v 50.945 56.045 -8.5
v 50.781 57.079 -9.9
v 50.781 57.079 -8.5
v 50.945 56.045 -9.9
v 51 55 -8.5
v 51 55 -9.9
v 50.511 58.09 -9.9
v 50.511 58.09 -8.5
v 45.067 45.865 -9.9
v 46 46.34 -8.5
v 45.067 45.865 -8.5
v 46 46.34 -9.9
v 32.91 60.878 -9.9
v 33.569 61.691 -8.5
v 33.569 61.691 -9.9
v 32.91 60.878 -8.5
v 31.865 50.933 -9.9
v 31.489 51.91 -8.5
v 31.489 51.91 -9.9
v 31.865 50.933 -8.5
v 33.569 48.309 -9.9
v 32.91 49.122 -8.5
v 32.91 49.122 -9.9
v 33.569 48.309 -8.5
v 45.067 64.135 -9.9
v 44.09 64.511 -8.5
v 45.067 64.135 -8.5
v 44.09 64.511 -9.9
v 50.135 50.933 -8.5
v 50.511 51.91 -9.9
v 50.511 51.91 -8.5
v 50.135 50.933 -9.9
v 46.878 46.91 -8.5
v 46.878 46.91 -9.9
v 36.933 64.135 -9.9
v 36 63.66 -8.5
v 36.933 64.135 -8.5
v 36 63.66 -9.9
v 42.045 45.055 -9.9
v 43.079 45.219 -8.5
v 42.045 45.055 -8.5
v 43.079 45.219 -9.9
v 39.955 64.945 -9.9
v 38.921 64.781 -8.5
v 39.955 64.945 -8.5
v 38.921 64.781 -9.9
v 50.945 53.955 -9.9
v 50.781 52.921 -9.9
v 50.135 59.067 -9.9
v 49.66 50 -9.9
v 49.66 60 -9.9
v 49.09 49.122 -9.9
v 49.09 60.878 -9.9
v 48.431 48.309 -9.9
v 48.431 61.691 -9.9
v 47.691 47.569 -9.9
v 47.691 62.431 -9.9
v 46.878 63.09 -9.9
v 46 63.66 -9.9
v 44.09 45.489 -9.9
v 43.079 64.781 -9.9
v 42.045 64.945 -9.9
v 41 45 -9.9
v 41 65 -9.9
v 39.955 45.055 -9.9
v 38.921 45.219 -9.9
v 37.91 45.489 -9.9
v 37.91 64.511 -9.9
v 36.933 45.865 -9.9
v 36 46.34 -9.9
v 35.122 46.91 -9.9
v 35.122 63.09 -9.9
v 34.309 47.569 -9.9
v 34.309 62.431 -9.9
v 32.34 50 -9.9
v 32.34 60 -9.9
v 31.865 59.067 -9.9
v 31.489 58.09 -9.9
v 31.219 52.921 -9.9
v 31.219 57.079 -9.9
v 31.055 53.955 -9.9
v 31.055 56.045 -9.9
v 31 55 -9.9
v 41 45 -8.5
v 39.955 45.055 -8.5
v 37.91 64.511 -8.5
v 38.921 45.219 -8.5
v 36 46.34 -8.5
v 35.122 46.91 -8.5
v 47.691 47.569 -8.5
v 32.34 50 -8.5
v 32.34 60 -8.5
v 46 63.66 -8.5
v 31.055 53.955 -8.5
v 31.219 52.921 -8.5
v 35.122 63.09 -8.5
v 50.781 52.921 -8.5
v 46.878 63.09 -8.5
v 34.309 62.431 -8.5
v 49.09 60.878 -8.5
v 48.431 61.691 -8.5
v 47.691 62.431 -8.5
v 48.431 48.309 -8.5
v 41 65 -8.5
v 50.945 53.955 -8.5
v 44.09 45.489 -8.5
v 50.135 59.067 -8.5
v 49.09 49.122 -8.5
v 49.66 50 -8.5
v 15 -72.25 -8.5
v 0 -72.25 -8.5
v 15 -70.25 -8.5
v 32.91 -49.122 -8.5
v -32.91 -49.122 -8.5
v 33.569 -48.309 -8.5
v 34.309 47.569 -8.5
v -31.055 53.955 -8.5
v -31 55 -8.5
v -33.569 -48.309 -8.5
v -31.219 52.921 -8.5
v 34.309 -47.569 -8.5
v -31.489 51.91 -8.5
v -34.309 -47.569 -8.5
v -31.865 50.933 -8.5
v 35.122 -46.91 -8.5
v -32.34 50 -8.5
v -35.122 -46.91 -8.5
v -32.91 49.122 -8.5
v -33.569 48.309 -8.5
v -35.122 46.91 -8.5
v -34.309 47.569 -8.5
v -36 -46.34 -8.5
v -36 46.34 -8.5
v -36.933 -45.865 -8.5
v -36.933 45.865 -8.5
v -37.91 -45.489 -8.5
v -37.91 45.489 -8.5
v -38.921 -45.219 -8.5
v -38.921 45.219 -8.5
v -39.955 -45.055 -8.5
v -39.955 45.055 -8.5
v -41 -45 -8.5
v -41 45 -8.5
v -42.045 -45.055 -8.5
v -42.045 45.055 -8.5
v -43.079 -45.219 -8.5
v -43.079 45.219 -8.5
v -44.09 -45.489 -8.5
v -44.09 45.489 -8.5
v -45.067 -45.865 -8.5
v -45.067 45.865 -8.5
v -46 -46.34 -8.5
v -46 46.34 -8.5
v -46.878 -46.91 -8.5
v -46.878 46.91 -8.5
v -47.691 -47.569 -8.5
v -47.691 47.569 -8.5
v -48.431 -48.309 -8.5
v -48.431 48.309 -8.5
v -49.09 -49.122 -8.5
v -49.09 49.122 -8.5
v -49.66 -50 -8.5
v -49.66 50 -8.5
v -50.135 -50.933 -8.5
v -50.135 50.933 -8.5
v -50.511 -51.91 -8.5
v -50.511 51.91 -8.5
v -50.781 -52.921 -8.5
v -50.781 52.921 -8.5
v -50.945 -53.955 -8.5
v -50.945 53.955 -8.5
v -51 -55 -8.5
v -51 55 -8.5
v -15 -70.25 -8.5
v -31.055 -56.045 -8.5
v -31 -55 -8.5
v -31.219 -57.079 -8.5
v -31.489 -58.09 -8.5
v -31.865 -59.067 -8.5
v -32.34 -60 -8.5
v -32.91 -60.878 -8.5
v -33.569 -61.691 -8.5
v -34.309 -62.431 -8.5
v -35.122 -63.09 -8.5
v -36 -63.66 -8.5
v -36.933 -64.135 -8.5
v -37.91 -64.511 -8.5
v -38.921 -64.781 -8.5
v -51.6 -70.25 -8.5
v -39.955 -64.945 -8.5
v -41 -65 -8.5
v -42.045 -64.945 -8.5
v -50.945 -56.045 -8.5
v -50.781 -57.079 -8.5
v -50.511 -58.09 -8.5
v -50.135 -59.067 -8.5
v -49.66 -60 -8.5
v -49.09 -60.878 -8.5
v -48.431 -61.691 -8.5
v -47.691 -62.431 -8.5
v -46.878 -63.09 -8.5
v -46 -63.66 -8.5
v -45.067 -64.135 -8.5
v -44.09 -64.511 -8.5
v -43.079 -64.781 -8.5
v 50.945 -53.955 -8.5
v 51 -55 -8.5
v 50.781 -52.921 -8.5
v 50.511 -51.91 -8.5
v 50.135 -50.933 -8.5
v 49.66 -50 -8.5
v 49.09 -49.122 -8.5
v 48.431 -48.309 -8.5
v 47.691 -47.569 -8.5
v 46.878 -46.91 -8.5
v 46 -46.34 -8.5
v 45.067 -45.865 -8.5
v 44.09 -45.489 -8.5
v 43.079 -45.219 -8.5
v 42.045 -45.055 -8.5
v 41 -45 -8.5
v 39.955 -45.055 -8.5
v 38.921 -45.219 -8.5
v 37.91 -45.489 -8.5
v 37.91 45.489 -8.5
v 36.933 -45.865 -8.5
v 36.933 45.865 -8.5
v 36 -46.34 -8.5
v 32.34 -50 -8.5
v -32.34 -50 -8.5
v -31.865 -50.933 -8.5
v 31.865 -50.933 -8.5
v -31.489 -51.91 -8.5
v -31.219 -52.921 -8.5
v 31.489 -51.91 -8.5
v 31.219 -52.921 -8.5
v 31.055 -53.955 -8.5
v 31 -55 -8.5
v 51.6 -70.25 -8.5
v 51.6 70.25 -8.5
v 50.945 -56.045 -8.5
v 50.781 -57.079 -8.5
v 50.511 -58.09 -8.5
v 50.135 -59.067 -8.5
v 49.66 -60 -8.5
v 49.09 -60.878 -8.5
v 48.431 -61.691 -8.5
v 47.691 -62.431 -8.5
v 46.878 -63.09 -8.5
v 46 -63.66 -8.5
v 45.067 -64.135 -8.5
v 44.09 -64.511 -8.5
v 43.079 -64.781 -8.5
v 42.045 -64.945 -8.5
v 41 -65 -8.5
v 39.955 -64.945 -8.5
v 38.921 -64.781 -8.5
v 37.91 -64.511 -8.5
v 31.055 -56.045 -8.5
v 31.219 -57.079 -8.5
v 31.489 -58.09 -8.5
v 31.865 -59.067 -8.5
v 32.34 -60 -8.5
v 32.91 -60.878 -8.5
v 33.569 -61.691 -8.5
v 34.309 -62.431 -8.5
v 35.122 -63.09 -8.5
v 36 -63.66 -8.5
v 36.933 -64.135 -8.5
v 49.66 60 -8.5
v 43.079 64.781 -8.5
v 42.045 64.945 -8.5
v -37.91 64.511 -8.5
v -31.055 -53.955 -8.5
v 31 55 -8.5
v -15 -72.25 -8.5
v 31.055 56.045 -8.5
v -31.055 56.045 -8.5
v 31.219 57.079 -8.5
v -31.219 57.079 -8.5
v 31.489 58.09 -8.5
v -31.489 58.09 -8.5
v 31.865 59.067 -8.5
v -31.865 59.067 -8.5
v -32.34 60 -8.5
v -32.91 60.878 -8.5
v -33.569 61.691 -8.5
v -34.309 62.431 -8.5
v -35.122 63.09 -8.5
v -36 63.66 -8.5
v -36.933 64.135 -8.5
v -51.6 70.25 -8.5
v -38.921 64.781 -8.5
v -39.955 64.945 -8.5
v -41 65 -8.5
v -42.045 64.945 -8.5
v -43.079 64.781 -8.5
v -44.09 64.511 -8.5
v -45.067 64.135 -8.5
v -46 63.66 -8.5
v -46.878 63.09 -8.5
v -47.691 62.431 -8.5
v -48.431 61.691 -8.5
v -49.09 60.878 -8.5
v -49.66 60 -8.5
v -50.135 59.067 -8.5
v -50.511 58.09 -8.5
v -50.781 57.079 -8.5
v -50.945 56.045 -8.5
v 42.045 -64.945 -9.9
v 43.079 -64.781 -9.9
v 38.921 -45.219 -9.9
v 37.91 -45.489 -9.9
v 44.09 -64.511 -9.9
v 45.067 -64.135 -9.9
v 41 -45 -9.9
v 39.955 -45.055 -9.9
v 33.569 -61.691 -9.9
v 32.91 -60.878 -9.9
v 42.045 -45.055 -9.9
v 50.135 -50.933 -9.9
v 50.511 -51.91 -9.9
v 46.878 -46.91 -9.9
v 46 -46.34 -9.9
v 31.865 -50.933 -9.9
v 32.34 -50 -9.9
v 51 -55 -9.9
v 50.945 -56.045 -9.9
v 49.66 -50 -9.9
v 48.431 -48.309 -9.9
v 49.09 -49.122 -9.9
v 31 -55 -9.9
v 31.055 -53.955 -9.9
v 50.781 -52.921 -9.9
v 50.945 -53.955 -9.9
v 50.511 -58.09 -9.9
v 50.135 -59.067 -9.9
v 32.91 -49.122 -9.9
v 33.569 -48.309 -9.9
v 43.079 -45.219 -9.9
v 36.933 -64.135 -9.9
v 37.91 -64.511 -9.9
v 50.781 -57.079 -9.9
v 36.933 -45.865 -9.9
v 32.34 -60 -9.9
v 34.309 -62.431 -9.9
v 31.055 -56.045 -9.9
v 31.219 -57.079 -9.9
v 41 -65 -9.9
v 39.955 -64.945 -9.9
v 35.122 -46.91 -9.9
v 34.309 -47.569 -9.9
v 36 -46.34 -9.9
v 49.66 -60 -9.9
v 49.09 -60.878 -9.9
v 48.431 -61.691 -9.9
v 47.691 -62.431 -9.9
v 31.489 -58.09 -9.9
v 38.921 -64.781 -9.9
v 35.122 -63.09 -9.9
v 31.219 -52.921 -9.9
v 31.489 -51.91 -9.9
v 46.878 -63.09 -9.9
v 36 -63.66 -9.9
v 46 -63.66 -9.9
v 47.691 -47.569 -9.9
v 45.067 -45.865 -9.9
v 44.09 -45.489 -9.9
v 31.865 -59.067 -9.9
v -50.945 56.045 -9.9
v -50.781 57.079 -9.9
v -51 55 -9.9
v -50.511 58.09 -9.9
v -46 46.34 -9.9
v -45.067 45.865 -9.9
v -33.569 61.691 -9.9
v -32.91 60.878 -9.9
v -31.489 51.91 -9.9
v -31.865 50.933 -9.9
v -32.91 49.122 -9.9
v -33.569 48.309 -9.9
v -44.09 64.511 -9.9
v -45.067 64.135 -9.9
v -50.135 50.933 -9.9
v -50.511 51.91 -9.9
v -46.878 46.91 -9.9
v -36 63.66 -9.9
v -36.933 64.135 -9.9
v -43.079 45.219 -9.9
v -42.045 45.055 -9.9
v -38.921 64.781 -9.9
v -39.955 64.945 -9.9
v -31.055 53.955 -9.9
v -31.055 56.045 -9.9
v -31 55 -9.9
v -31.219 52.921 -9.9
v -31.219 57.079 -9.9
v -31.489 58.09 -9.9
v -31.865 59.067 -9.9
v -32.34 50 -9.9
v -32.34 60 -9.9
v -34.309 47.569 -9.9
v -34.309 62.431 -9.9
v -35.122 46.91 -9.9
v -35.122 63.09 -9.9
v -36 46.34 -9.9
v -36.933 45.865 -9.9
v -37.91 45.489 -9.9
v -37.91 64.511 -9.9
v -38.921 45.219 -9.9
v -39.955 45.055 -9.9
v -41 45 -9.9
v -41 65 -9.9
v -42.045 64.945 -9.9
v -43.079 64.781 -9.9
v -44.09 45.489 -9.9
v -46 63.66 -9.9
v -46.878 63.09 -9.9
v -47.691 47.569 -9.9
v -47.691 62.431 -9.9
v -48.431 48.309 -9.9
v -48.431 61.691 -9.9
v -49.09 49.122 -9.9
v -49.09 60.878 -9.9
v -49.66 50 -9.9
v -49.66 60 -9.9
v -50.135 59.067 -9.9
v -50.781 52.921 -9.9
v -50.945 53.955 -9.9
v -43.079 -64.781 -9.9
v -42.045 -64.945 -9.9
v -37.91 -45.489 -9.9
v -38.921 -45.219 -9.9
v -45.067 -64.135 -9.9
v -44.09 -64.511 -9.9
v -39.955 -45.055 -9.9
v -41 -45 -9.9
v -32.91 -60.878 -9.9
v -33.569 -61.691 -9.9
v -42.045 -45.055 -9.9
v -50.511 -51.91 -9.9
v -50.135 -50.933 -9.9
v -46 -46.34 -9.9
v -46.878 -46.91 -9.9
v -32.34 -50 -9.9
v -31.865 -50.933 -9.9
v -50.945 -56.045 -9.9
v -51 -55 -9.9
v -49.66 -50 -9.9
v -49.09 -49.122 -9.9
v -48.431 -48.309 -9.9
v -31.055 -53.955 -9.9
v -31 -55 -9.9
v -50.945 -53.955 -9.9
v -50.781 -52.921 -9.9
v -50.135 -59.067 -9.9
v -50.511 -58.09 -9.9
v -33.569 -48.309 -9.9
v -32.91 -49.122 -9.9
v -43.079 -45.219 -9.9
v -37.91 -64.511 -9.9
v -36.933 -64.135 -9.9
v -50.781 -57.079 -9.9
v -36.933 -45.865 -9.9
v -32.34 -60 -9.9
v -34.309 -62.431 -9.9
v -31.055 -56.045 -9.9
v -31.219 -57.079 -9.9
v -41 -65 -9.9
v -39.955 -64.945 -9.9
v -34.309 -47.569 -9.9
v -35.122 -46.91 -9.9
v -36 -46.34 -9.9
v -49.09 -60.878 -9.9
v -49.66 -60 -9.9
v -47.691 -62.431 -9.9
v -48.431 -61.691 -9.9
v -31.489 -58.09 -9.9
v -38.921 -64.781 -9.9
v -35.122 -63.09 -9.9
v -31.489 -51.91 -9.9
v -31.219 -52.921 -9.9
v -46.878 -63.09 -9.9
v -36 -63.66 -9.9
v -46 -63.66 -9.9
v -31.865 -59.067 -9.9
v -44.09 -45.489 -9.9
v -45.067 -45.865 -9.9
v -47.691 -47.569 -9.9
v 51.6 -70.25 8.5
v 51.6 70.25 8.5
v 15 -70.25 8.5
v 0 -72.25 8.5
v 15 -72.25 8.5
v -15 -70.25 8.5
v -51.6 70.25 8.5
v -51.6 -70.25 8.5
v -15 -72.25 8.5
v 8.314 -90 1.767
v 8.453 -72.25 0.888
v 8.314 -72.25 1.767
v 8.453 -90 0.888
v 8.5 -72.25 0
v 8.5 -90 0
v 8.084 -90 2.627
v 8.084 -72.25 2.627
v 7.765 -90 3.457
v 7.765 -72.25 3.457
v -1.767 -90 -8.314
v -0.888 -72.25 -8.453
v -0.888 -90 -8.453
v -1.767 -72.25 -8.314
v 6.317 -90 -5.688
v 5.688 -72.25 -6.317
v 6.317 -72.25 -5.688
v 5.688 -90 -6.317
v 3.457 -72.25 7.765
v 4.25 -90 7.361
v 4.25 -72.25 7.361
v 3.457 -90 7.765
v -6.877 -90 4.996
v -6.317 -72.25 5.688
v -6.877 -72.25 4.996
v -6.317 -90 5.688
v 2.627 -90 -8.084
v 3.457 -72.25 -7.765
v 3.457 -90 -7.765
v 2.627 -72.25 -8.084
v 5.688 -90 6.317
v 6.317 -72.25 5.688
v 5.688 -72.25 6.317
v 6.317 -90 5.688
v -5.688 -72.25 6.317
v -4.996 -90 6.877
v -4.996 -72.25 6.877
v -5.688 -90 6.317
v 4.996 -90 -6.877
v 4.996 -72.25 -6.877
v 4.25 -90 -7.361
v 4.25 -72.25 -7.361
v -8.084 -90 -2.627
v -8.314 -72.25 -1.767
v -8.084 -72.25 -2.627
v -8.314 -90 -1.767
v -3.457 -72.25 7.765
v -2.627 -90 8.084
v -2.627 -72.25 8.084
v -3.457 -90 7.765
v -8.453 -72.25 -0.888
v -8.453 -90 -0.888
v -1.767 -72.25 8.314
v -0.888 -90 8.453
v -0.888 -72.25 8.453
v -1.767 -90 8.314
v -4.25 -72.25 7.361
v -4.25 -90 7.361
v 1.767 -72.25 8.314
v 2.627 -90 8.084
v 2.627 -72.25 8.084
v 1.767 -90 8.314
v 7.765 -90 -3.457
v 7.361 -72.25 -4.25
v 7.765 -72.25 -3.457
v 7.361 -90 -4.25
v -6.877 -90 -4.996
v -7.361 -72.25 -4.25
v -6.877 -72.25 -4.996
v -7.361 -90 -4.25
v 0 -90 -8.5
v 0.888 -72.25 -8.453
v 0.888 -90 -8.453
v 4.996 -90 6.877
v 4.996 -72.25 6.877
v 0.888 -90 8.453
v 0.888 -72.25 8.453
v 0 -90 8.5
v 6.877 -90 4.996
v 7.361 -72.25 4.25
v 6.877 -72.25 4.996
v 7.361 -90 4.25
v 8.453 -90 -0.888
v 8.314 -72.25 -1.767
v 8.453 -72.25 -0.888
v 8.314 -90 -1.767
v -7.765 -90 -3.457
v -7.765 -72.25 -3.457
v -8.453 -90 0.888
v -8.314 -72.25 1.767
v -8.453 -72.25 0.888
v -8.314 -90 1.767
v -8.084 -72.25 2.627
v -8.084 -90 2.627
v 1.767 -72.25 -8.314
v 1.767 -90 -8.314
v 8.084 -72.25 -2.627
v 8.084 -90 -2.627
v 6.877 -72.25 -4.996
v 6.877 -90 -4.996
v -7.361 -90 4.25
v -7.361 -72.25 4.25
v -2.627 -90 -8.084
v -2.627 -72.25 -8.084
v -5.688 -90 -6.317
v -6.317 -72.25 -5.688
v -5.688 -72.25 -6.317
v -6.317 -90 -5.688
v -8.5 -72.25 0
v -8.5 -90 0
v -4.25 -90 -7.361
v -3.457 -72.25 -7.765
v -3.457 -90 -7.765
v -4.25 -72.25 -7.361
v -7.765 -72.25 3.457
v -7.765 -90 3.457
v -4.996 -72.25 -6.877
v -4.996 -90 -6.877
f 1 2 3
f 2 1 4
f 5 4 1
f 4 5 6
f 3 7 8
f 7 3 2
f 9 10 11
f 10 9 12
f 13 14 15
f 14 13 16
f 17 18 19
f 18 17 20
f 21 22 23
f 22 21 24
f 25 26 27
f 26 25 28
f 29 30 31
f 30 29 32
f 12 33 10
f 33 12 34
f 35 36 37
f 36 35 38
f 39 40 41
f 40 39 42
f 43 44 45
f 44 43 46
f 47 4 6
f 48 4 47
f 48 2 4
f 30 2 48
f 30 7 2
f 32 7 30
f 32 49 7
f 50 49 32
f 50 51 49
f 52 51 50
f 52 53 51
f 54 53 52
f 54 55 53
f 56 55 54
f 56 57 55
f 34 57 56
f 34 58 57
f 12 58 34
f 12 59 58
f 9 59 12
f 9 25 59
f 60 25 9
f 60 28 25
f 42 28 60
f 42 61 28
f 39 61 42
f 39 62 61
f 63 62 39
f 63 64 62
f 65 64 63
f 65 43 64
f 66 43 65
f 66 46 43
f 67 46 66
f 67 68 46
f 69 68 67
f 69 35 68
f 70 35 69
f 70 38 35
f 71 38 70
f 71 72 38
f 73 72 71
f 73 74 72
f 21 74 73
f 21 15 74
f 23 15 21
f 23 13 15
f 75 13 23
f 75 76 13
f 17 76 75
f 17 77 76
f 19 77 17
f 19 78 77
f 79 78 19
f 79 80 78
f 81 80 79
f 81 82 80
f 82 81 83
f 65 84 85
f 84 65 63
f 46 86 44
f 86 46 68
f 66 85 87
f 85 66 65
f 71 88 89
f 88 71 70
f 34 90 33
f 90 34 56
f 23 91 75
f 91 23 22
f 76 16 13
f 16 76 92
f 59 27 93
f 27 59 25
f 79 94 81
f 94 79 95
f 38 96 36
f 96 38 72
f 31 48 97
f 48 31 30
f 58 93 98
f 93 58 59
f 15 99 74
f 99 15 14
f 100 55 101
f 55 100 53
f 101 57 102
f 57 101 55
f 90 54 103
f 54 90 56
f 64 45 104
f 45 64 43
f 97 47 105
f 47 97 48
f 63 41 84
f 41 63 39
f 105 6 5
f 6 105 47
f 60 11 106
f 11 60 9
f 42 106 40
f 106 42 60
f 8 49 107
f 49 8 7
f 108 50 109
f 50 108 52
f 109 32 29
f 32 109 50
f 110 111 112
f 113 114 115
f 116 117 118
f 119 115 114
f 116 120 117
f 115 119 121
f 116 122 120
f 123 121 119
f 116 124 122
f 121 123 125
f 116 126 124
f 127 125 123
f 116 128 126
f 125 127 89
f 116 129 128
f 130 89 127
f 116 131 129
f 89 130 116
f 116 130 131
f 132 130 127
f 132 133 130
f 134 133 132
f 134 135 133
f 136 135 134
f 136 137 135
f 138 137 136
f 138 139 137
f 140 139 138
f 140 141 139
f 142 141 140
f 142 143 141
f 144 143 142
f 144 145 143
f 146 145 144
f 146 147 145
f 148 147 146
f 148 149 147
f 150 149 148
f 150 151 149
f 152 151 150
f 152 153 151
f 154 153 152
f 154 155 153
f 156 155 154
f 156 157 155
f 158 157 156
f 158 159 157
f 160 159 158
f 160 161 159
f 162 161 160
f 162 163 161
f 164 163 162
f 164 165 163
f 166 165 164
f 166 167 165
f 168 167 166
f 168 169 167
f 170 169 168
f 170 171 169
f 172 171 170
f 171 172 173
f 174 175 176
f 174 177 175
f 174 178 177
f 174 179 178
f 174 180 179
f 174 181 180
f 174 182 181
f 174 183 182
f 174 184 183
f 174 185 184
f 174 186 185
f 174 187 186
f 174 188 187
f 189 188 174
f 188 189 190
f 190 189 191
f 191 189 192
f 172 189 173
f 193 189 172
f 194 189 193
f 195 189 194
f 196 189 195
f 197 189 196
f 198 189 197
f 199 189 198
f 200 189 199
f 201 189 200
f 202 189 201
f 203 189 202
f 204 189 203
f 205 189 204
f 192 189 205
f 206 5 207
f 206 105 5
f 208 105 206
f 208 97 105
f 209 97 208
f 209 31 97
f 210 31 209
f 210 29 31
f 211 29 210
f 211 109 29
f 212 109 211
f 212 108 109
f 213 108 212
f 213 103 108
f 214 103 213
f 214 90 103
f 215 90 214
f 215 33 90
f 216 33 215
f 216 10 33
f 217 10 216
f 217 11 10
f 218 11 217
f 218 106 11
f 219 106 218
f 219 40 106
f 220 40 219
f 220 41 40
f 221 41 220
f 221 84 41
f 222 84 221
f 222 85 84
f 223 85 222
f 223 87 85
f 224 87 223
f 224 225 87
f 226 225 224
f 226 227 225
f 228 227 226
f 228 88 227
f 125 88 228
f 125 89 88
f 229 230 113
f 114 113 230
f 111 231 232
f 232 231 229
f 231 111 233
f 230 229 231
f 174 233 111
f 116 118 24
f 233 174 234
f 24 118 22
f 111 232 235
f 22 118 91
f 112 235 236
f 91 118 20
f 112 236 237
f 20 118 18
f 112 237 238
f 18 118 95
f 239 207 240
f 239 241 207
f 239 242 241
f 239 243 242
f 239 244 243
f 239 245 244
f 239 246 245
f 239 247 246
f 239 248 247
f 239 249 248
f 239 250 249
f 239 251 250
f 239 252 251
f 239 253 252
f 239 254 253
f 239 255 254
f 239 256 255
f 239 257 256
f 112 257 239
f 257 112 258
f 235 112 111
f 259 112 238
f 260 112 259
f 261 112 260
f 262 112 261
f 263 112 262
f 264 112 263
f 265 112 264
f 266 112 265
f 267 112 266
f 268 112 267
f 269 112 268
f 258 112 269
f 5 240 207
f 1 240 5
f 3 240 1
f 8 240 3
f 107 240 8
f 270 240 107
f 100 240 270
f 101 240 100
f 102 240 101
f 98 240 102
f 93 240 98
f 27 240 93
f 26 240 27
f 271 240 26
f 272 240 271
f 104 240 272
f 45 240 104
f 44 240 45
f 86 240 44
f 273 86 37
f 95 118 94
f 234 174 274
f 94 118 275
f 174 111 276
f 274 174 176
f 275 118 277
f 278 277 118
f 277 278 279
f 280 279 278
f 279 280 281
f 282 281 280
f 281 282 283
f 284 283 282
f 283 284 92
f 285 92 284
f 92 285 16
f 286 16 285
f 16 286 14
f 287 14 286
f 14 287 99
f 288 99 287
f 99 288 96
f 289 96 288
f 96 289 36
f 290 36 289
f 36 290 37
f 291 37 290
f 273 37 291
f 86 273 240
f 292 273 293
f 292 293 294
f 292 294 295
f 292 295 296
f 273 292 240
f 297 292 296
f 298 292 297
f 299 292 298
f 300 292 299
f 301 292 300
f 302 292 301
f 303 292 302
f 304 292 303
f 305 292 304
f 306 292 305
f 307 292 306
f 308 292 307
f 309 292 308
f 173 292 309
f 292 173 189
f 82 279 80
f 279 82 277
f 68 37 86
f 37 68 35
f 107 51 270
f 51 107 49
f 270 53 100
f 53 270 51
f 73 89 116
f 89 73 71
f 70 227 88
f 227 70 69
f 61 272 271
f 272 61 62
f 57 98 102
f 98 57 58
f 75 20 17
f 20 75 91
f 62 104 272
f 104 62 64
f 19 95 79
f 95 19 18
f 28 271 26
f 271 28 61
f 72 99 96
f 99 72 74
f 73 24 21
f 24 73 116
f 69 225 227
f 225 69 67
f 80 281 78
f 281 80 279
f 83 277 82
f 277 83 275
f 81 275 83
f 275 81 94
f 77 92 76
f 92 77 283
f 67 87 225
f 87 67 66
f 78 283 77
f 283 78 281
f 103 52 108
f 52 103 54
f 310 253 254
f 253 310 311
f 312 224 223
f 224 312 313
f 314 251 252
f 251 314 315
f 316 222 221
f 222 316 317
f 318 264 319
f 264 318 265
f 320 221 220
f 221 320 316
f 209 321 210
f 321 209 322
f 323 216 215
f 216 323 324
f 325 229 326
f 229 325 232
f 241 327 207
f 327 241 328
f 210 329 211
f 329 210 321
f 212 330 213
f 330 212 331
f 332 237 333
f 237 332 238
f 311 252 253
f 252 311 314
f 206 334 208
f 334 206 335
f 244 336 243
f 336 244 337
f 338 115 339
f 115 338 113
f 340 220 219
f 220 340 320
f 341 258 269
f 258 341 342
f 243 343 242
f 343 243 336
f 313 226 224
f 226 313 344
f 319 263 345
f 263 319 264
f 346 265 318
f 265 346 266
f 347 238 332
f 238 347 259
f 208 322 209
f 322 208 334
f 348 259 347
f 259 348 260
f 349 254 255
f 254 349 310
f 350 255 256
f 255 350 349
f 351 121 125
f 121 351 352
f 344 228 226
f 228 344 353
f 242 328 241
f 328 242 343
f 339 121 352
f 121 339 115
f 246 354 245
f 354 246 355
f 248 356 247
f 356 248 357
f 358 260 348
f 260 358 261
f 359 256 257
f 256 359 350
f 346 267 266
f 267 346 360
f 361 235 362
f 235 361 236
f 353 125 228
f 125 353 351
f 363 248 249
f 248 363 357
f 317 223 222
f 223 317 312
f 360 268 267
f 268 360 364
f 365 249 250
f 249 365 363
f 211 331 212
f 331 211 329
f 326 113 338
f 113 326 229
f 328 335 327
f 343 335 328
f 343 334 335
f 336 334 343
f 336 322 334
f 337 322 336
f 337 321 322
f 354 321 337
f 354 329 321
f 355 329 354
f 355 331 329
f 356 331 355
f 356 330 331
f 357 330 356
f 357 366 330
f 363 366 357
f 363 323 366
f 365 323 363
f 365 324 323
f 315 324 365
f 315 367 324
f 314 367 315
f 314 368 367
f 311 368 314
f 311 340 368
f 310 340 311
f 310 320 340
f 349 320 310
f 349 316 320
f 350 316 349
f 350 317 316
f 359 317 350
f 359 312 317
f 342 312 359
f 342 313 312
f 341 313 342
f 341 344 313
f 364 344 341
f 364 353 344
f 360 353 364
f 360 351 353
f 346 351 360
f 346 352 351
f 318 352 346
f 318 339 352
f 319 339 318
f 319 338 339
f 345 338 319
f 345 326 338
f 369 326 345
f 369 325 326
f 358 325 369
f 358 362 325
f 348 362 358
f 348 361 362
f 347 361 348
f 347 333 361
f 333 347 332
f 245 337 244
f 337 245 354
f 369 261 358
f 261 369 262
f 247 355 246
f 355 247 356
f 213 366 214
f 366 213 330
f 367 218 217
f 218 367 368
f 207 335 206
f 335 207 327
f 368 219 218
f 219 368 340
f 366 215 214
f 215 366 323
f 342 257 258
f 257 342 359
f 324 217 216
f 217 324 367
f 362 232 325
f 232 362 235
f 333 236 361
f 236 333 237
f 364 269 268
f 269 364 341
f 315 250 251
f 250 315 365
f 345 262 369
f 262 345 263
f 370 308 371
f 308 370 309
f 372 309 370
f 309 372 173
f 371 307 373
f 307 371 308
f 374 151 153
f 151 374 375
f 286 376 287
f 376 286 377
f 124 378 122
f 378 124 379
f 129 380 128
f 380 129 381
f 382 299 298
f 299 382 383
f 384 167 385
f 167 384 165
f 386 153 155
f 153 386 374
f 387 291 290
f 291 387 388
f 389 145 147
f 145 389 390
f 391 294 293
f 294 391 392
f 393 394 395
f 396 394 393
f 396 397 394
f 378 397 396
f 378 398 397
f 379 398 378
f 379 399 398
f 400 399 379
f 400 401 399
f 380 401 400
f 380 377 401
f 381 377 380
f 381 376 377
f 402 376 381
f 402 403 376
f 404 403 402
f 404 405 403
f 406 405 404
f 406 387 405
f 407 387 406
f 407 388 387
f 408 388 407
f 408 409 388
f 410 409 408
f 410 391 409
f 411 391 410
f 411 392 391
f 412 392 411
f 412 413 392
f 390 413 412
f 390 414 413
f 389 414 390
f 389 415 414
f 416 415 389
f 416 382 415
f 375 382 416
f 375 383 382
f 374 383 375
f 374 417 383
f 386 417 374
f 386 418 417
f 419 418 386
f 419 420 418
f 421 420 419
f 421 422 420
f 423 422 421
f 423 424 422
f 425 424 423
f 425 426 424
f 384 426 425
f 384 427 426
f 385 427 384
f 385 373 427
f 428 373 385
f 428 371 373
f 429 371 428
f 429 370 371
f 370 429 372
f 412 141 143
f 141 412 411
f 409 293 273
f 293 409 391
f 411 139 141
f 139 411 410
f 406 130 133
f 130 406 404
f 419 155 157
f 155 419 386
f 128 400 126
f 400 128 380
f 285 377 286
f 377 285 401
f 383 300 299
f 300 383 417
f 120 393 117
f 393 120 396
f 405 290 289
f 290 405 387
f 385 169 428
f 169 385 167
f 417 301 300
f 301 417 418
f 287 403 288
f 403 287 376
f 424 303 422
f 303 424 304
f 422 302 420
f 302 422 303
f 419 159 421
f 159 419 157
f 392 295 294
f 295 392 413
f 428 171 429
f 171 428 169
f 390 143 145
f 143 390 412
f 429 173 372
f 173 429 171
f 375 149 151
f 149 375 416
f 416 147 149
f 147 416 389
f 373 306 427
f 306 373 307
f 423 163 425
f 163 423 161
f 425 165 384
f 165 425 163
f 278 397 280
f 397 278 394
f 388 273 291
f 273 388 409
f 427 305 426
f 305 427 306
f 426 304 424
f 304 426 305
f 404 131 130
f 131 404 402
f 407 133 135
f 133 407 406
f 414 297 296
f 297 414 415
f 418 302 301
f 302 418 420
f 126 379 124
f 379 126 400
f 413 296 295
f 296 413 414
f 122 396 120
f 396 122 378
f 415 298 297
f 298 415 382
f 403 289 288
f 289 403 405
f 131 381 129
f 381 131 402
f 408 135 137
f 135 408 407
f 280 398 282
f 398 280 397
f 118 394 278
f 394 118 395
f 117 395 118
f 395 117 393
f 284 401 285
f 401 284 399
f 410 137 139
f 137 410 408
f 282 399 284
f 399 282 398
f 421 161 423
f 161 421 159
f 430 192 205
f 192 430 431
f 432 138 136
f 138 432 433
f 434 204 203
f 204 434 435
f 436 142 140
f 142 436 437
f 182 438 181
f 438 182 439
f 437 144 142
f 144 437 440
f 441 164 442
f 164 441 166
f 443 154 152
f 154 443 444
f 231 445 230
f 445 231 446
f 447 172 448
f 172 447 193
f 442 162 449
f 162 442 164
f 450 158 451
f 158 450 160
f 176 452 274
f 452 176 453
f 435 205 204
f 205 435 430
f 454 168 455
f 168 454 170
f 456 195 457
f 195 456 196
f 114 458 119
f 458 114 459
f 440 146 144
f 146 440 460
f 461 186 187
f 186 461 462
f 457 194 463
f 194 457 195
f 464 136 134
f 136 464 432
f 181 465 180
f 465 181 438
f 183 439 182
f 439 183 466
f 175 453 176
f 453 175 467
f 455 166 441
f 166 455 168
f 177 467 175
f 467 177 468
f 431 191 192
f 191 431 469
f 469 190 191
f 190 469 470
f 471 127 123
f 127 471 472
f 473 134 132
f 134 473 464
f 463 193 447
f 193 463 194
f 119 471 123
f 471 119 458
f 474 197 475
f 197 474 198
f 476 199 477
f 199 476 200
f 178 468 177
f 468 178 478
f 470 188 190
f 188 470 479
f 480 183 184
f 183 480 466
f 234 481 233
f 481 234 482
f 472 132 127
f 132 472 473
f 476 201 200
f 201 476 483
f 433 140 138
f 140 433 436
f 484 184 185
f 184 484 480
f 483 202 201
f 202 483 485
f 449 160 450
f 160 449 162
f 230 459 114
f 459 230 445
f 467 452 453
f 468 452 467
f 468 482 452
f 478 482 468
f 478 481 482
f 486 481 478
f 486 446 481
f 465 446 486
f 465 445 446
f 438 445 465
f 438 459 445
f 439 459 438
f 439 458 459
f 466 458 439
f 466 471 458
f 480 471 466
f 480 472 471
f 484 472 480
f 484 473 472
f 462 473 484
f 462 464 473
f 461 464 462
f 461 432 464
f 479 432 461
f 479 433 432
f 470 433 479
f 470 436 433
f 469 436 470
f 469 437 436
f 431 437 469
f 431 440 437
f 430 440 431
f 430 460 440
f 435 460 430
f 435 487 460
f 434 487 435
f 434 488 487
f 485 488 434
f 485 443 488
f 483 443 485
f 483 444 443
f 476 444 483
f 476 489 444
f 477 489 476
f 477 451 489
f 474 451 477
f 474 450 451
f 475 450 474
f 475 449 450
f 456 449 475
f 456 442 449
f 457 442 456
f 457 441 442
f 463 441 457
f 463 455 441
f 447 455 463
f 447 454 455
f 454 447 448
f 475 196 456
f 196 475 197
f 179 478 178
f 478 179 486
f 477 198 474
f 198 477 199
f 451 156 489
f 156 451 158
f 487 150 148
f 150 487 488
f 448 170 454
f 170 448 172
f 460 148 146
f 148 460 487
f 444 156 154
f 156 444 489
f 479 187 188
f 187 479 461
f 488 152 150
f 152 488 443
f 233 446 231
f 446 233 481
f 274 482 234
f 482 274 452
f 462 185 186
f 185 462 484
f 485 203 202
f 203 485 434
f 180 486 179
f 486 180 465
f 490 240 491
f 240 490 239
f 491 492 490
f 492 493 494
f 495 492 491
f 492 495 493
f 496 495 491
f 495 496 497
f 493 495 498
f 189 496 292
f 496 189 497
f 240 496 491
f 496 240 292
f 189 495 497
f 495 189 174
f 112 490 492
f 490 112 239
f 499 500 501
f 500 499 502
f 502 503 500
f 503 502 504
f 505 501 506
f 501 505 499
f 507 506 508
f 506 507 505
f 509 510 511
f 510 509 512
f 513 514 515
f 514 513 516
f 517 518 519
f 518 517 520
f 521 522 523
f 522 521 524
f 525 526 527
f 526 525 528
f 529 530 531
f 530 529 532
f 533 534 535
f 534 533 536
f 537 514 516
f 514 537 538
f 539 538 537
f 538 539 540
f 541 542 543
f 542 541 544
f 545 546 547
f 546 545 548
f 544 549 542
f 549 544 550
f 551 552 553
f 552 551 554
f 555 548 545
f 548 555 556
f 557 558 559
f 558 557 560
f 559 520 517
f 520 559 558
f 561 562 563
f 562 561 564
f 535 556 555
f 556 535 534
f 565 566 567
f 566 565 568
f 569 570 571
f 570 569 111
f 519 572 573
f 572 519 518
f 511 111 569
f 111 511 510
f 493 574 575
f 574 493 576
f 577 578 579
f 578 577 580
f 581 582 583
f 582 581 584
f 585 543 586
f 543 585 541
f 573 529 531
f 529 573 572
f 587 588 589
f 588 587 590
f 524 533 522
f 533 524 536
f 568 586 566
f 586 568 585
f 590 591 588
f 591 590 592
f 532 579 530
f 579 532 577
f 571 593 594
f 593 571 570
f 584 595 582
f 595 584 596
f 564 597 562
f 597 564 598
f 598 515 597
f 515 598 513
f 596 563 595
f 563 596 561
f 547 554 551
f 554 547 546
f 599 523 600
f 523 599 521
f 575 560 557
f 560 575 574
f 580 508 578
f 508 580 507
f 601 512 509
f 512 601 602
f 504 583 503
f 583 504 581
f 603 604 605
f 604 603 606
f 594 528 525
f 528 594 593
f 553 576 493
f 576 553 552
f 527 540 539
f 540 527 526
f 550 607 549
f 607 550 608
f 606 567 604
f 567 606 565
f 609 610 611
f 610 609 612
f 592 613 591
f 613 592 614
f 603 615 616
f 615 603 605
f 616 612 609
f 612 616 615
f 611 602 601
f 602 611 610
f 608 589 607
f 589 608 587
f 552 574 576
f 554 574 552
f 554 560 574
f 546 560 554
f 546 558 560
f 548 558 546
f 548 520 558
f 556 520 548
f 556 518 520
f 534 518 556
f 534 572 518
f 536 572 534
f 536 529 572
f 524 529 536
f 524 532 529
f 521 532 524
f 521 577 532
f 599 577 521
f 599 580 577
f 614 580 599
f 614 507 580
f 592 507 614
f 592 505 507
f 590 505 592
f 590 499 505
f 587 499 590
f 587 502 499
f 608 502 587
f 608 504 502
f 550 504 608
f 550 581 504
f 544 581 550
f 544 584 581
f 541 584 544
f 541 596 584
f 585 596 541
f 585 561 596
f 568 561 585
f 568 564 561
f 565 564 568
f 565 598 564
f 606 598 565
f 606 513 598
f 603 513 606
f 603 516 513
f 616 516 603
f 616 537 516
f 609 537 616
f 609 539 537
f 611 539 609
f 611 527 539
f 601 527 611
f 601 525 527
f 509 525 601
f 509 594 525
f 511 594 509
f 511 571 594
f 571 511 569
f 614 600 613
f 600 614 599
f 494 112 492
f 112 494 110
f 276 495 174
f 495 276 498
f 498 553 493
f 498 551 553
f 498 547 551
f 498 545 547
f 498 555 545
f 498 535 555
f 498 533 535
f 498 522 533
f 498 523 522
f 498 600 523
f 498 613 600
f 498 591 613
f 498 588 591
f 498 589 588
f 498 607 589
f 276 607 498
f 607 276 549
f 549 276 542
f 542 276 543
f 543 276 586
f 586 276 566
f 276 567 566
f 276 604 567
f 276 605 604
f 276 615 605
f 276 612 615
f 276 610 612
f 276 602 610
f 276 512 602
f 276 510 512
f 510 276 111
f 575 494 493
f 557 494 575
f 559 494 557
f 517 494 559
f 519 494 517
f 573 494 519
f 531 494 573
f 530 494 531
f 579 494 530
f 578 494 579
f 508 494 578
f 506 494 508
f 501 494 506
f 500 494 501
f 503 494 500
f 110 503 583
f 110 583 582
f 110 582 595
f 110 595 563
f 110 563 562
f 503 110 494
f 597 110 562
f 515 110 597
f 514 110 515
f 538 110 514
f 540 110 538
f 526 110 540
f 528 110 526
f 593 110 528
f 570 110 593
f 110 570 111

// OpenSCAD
// file: ../Lib/o-ring.scad
module o_ring(id=20,girth=2.5){
    rotate_extrude(angle=360)translate([(id+girth)/2,0])circle(d=girth);
    //cylinder(d=id,h=0.1, center=true);    
}

o_ring(id=40, girth=5);
// file: ../Lib/fillet_cylinder.scad
module filleted_cylinder(
    cylinder_height=2,
    cylinder_radius=1,
    fillet_radius_bottom=1,
    fillet_radius_top=0,
    nfaces=50
) {
    /* created by Kevin Lam on Dec 3, 2016 */
    union() {      
        cylinder(cylinder_height, r=cylinder_radius, $fn=nfaces, false);
        
        if (fillet_radius_bottom > 0) {
            difference() {
                cylinder(fillet_radius_bottom, r=cylinder_radius+fillet_radius_bottom, $fn=nfaces, false);
                translate([0, 0, fillet_radius_bottom])
                rotate_extrude($fn=nfaces)
                translate([cylinder_radius+fillet_radius_bottom, 0, 0])
                circle(fillet_radius_bottom, $fn=nfaces);
            }
        }
        
        if (fillet_radius_top>0) {
            difference() {
                translate([0,0,cylinder_height-fillet_radius_top])
                cylinder(fillet_radius_top, r=cylinder_radius+fillet_radius_top, $fn=nfaces, false);
                
                translate([0, 0, cylinder_height-fillet_radius_top])
                rotate_extrude($fn=nfaces)
                translate([cylinder_radius+fillet_radius_top, 0, 0])
                circle(fillet_radius_top, $fn=nfaces);
            }
        }
    }
}
// file: ../Lib/prism.scad
   module prism(l, w, h){
   polyhedron(
           points=[[0,0,0], [l,0,0], [l,w,0], [0,w,0], [0,w,h], [l,w,h]],
           faces=[[0,1,2,3],[5,4,3,2],[0,4,5,1],[0,3,4],[5,2,1]]
           );

   }
   
// file: ../Lib/corner_radiuser.scad
module cornerRadiuser(radius=6){
    difference(){
        translate([radius/2,radius/2,0])
        cube([radius,radius,radius*2], center=true);
        cylinder(h=(radius*2)+2,r=radius, center=true);
    }
}
// file: ../Lib/steppers.scad
/**
 * Implementation of a model of a 28BYJ-48 type cheapo stepper motor
 */
use <mirrorcopy.scad>;
module stepper28BYJ48(){
    color("light grey"){
        translate([0,-8,0]){
            // Motor body
            translate([0,0,(19/2)*-1]){
                cylinder(d=28,h=19, center=true);
            }

            // Motor snooter
            translate([0,8,0]){
                translate([0,0,(1.5/2)])cylinder(d=9,h=1.5, center=true);
                difference(){
                    translate([0,0,(5/2)+2])cylinder(d=5,h=6, center=true);
                    mirrorCopy([0,1,0]){
                        translate([0,4,(5/2)+2.1])cube([5,5,6.2], center=true);
                    }
                }
            }
            
            // cable gland
            translate([0,(17/2)*-1,(19/2)*-1]){
                cube([14.8,17,19], center=true);
            }
            
            // Attachment crossbar
            difference(){
                hull(){
                    mirrorCopy([1,-0,0]){
                        translate([(35/2),0,(1/2)*-1]){
                            cylinder(h=1,d=7, center=true);
                        }
                    }
                }
                mirrorCopy([1,-0,0]){
                    translate([(35/2),0,(1/2)*-1]){
                        cylinder(h=1+0.01,d=4.2, center=true);
                    }
                }
            }
        }
    }
}


module stepper28BYJ48_cutouts(){
    color("orange"){
        translate([0,-8,0]){
            mirrorCopy([1,-0,0]){
                translate([(35/2),0,(1/2)*-1]){
                    cylinder(h=1+0.01,d=4.2, center=true);
                }
            }
        }
    }
}

module nemaCutout(shaftClearance, shaftGirth, shaftLength, frameSize, holeSpacing,holeDiameter=3,       nemaSlotSlackMM=0, shaft=false){
    translate([0,0,frameSize/-2]){
        hull(){
            mirrorCopy([0,1,0]){
                translate([0,nemaSlotSlackMM/2]){
                    cube([frameSize*1.01,frameSize*1.01,frameSize], center=true);
                }
            }
        }
    }
    if(!shaft){
        translate([0,0,10/2]){
            mirrorCopy([1,0,0]){
                mirrorCopy([0,1,0]){
                    translate([holeSpacing/2,holeSpacing/2,0]){
                        hull(){
                            mirrorCopy([0,1,0]){
                                translate([0,nemaSlotSlackMM/2,0]){
                                    cylinder(d=holeDiameter*1.1,h=30,center=true);
                                }
                            }
                        }
                    }
                }
            }
        }
    }
    
    if(!shaft){
        translate([0,0,-0.5]){
            cylinder(d=shaftClearance*1.03,h=shaftLength+1);
        }
    }else{
        difference(){
            cylinder(d=shaftGirth*1.03,h=shaftLength*2, $fn=360);
            translate([frameSize/-2,(shaftGirth/2)-(shaftGirth)*0.15,shaftLength*0.3+0.01]){
                cube([frameSize,frameSize/2,shaftLength*0.70]);
                translate([0,0,shaftLength*0.70-1])cube([frameSize,frameSize/2,shaftLength+1]);
            }
        }
    }
}

module nema14_cutout(){
    nemaCutout(22,5,24,35,26,3,2, shaft);
}

module nema17_cutout(shaft=false){
    
    nemaCutout(22,5,24,42.3,31,3,2, shaft);
}

nema17_cutout(true);
// file: ../Lib/metric_bolts.scad
capSizeMSizeMultiplier = 1.66*1.01;
printingKerfMM = 0.6;
circleFacets = 60;
boltColour = "LightSkyBlue";
boltClearanceColour = "LightSteelBlue";
boltClearanceTransparency = 0.3;

module metricBoltHex(mSize, structural=false, recessNut=0, chamfer=false){
    // Hex diameter = mSize * 1.8, (or 2.0 if structural
    // We add 1% to make the hex slip in better
    hexDiameter = (mSize * (structural?2.0:1.8) * 1.01) + printingKerfMM;

    color(boltColour)
    translate([0,0,(mSize*0.7)/2])
    cylinder(d=hexDiameter,h=mSize * 0.7, $fn=6, center=true);
    
    if(recessNut > 0){
        color(boltClearanceColour, boltClearanceTransparency)
        translate([0,0,(recessNut/2)*-1+0.1])
        cylinder(d=hexDiameter,h=recessNut+0.1, $fn=6, center=true);
    }
    if(chamfer){
        chamferHeight = mSize*1.5*0.595;
        color(boltClearanceColour, boltClearanceTransparency)
        translate([0,0,(mSize * 0.7)+(chamferHeight/2)])
        cylinder(d1=hexDiameter,d2=0,h=chamferHeight, center=true, $fn=6);
    }
}

module metricSocketCap(mSize, length, structural=false,recessCap=0, chamfer=false, overrideCapSize=0){
    //cap size = M number * 1.5.
    // We add 1% to make the cap head spin nicely in the hole.
    capSize = overrideCapSize > 0 ? overrideCapSize : (mSize * capSizeMSizeMultiplier) + printingKerfMM;
    
    color(boltColour)
        translate([0,0,(length + ((mSize*1.25)/2))])
            cylinder(d=capSize,h=mSize*1.25, center=true, $fn=circleFacets);
    //echo (str("cap size is ", capSize));
    if(recessCap > 0){
        color(boltClearanceColour, boltClearanceTransparency)
        translate([0,0,(length + ((recessCap/2)+(mSize*1.25)))])
        cylinder(d=capSize,h=recessCap, center=true, $fn=circleFacets);
    }
    if(chamfer){
        color(boltClearanceColour, boltClearanceTransparency)
        translate([0,0,(length-((mSize*1.5*0.595)/2))])
        cylinder(d2=capSize,d1=0,h=mSize*1.5*0.595, center=true, $fn=circleFacets);
    }
}

module metricShaft(mSize, length, structural=false){
    color(boltColour)
        translate([0,0,(length/2)])
            cylinder(d=mSize+printingKerfMM, h=length+0.01, center=true, $fn=circleFacets);
}

module metricSocketScrew(mSize, length, structural=false, recessCap=0, chamfer=false, overrideCapSize=0){
    metricSocketCap(mSize, length, structural=structural, recessCap=recessCap, chamfer=chamfer, overrideCapSize=overrideCapSize);
    metricShaft(mSize, length, structural=structural);
}

module metricCapheadAndBolt(mSize, length=40, structural=false, recessCap=0, recessNut=0, chamfer=false, overrideCapSize=0){
    capSize = overrideCapSize > 0 ? overrideCapSize : (mSize * capSizeMSizeMultiplier) + printingKerfMM;

    /*echo (str("Creating a M",mSize, " size, ", length, "mm long bolt with a ", capSize, "mm wide caphead and bolt ", chamfer?"with":"without", " chamfering."));
    if(recessCap){
        echo (str("It has a ", recessCap, "mm recessed cap"));
    }
    if(recessNut){
        echo (str("It has a ", recessCap, "mm recessed nut"));
    }/**/
    translate([0,0,((length/2)+((mSize*1.25)/2))*-1])
    union(){
        translate([0, 0, 0])
        metricSocketScrew(mSize, length, structural=structural, recessCap=recessCap, chamfer=chamfer, overrideCapSize=overrideCapSize);
        metricBoltHex(mSize,structural, recessNut=recessNut, chamfer=chamfer);
    }
}

/**/
translate([0,10,0])
metricCapheadAndBolt(6, 40);

translate([20,10,0])
metricCapheadAndBolt(6, 40, recessNut=1, recessCap=1, chamfer=true);
/**/
/*
translate([0,10,0])
metricCapheadAndBolt(6, 20, recessNut=10, recessCap=10);
/*
translate([0,20,0])
metricCapheadAndBolt(6, 20, chamfer=true);

translate([20,0,0])
metricCapheadAndBolt(10, 40);

translate([20,20,0])
metricCapheadAndBolt(10, 40, recessNut=10, recessCap=10);

translate([20,40,0])
metricCapheadAndBolt(10, 40, chamfer=true);
*/
// file: ../Lib/pcd.scad
module pcd(degrees){
    count=360/degrees;
    for(i=[1 : count]){
        rotate(degrees*i)
        children();
    }
}

module pcdAtFixedDegrees(degrees){
    for(degree=degrees){
        rotate(degree)
        children();
    }
}
// file: ../Lib/extrusion.scad
use <mirrorcopy.scad>
module doubleExtrusion(width,length, center=false){
    extraWallWidth = width*0.09;
    mirrorCopy([0,1,0]){
        color("orange")
        translate([0,(width - extraWallWidth)/2,length/2])
        cube([center?0:width/2,extraWallWidth,length], center=true);
    }
    
    translate([(width/2),0,0])
    children();
    translate([(width/2)*-1,0,0])
    children();
    color("grey",0.1)hull(){
        translate([(width/2),0,0])
        children();
        translate([(width/2)*-1,0,0])
        children();
    }
}

module extrusion_sub(length=10, outer=40, tSlot=8, gusset=4.5, bore=7, center=false){
    translate([0,0,center?0:length/2]){
        difference(){
            color("orange")
            union(){
                // Corners
                mirrorCopy([1,0,0]){
                    mirrorCopy([0,1,0]){
                        difference(){
                            union(){
                                translate([((outer-(outer-tSlot)/2)/2),(outer-(gusset))/2,0])
                                cube([(outer-tSlot)/2, (gusset),length], center=true);
                                mirror([-1,1,0])
                                translate([((outer-(outer-tSlot)/2)/2),(outer-(gusset))/2,0])
                                cube([(outer-tSlot)/2, (gusset),length], center=true);
                            }
                            difference(){
                                translate([((outer-(gusset))/2)+1,((outer-(gusset))/2)+1,0])
                                    cube([gusset*2,gusset*2,length+2], center=true);
                                translate([(outer-(gusset*2))/2,(outer-(gusset*2))/2,0])
                                    cylinder(d=gusset*2,h=length+4, center=true);
                            }
                        }
                    }
                }
                
                // Crossbar
                mirrorCopy(){
                    rotate(45)
                    cube([outer*1.3, gusset, length], center=true);
                }
                
                // Core
                cube([bore*2,bore*2,length], center=true);
            };
            
            union(){
                // Tappable Bore
                cylinder(d=bore, h=length+2, center=true);
            }
        }
    }
}
module extrusion(length=10, outer=40, tSlot=8, gusset=4.5, bore=7, center=false){
    color("grey",0.1)hull()extrusion_sub(length=length, outer=outer, tSlot=tSlot, gusset=gusset, bore=bore, center=center);
    extrusion_sub(length=length, outer=outer, tSlot=tSlot, gusset=gusset, bore=bore, center=center);
    echo(str("BOM: Extrusion(",outer,"mm) length=",length,"mm"));
}

module extrusion80x40(length, center=false){
    doubleExtrusion(40,length, center=center)
    extrusion40x40(length, center=center);
}
module extrusion60x30(length, center=false){
    doubleExtrusion(30,length, center=center)
    extrusion30x30(length, center=center);
}
module extrusion40x20(length, center=false){
    doubleExtrusion(20,length, center=center)
    extrusion20x20(length, center=center);
}

module extrusion20x20(length, center=false)
{
    extrusion(length=length, outer=20,tSlot=5, gusset=1.8, bore=4, center=center);
}

module extrusion30x30(length, center=false)
{
    extrusion(length=length, outer=30,tSlot=8, gusset=2.5, bore=7, center=center);
}

module extrusion40x40(length, center=false)
{
    extrusion(length=length, outer=40,tSlot=8, gusset=4.5, bore=7, center=center);
}
/**/
translate([-40,0,0])extrusion20x20(10, center=true);
translate([-60,30,0])extrusion30x30(10, center=true);
translate([-80,30+40,0])extrusion40x40(10, center=true);

translate([0,0,0])extrusion20x20(10);
translate([0,30,0])extrusion30x30(10);
translate([0,30+40,0])extrusion40x40(10);

translate([40,0,0])extrusion40x20(10);
translate([60,30,0])extrusion60x30(10);
translate([80,30+40,0])extrusion80x40(10);
/**/
// file: ../Lib/part_splitter.scad
module partSplitter(height=0,maxSize=200, spread=10, top=true, bottom=true){
    if($preview){
        children();
        translate([0,0,height])
            #cube([maxSize,maxSize,0.01], center=true);
    }else{
        if(top){
            color("red")
                translate([0,0,(spread/2)])
                    difference(){
                        children();
                        translate([0,0,((maxSize/2)*-1)+height])
                            cube([maxSize,maxSize,maxSize], center=true);
                    }
        }
        if(bottom){
            color("green")
                translate([0,0,(spread/2)*-1])
                    difference(){
                        children();
                        translate([0,0,(maxSize/2)+height])
                            cube([maxSize,maxSize,maxSize], center=true);
                    }
        }
    }
} 
// file: ../Lib/mirrorcopy.scad
module mirrorCopy(vec=[1,0,0]){
    children();
    mirror(vec) children();
} 
// file: ../Lib/bearings.scad
$useMcMaster = true;
module bearing(id, od, wd, mcmaster, series, labels=false){
    echo(str("Creating a ", series, " bearing with id=", id, "mm od=", od, "mm width=", wd, "mm ..."));
    difference(){
        color("grey")cylinder(d=od,h=wd, center=true);
        color("white")cylinder(d=id,h=wd+1, center=true);  
        if($preview && labels){
            bearing_lettering(id, od, wd, mcmaster, series);    
        }
    }
}

module bearing_lettering(id, od, wd, mcmaster, series)
{
    degreesSeries = 25*len(series);
    degreesMcMaster = 25*len(mcmaster);
    color("black")
    rotate(180+45){
        rotate(degreesSeries)
        bearing_text(id,od, wd, series,degreesSeries);
        if($useMcMaster){
            rotate(degreesMcMaster+degreesSeries+10)
            bearing_text(id,od, wd, mcmaster, degreesMcMaster);   
        }
    }
}

module bearing_text(id, od, wd, st, radiusConsumed=180){
    bearingGirth = (od-id)/2;
    letterHeight = bearingGirth * 0.6;
    letterOffsetFromCenter = (od/2) - (bearingGirth*0.9);
    
    width=bearingGirth ;
    thickness=wd/20 ;
    chars=len(st)+1 ;
    //echo(str("Writing ", st, " at " , letterOffsetFromCenter, "mm from center"));
    for (i = [1:chars]) {
            rotate([0,0,90-(i*(radiusConsumed/chars))])
            translate([0,letterOffsetFromCenter,(bearingGirth/2)-((thickness+1)/2)])
            linear_extrude(thickness+1)
            text(st[i-1],size=letterHeight, halign="center");
    }
}


module bearing_608(labels=true){ bearing(8,22,7,"5972K91","608", labels=labels); }
module bearing_629(labels=true){ bearing(9,26,8,"5972K93","629", labels=labels); }
module bearing_635(labels=true){ bearing(5,19,6,"5972K197","635", labels=labels); }
module bearing_6000(labels=true){ bearing(10,26,8,"5972K94","6000", labels=labels); }
module bearing_6001(labels=true){ bearing(12,28,8,"5972K95","6001", labels=labels); }
module bearing_6002(labels=true){ bearing(15,32,9,"5972K358","6002", labels=labels); }
module bearing_6003(labels=true){ bearing(17,35,10,"5972K311","6003", labels=labels); }
module bearing_6007(labels=true){ bearing(35,62,14,"5972K312","6007", labels=labels); }
module bearing_6200(labels=true){ bearing(10,30,9,"5972K101","6200", labels=labels); }
module bearing_6201(labels=true){ bearing(12,32,10,"5972K313","6201", labels=labels); }
module bearing_6202(labels=true){ bearing(15,35,11,"5972K314","6202", labels=labels); }
module bearing_6203(labels=true){ bearing(17,40,12,"5972K104","6203", labels=labels); }
module bearing_6204(labels=true){ bearing(20,47,14,"5972K105","6204", labels=labels); }
module bearing_6205(labels=true){ bearing(25,52,15,"5972K315","6205", labels=labels); }
module bearing_6206(labels=true){ bearing(30,62,16,"5972K316","6206", labels=labels); }
module bearing_6207(labels=true){ bearing(35,72,17,"5972K317","6207", labels=labels); }
module bearing_6208(labels=true){ bearing(40,80,18,"5972K114","6208", labels=labels); }
module bearing_6209(labels=true){ bearing(45,85,19,"5972K115","6209", labels=labels); }
module bearing_6210(labels=true){ bearing(50,90,20,"5972K129","6210", labels=labels); }
module bearing_6211(labels=true){ bearing(55,100,21,"5972K113","6211", labels=labels); }
module bearing_6212(labels=true){ bearing(60,110,22,"5972K3","6212", labels=labels); }
module bearing_6301(labels=true){ bearing(12,37,12,"5972K318","6301", labels=labels); }
module bearing_6302(labels=true){ bearing(15,42,13,"5972K117","6302", labels=labels); }
module bearing_6303(labels=true){ bearing(17,47,14,"5972K118","6303", labels=labels); }
module bearing_6304(labels=true){ bearing(20,52,15,"5972K119","6304", labels=labels); }
module bearing_6305(labels=true){ bearing(25,62,17,"5972K121","6305", labels=labels); }
module bearing_6306(labels=true){ bearing(30,72,19,"5972K319","6306", labels=labels); }
module bearing_6307(labels=true){ bearing(35,80,21,"5972K503","6307", labels=labels); }
module bearing_6308(labels=true){ bearing(40,90,23,"5972K124","6308", labels=labels); }
module bearing_6309(labels=true){ bearing(45,100,25,"5972K125","6309", labels=labels); }
module bearing_6310(labels=true){ bearing(50,110,27,"5972K126","6310", labels=labels); }
module bearing_6311(labels=true){ bearing(55,120,29,"5972K127","6311", labels=labels); }
module bearing_6312(labels=true){ bearing(60,130,31,"5972K128","6312", labels=labels); }
module bearing_6403(labels=true){ bearing(17,62,17,"5972K198","6403", labels=labels); }
module bearing_6800(labels=true){ bearing(10,19,5,"5972K211","6800", labels=labels); }
module bearing_6801(labels=true){ bearing(12,21,5,"5972K212","6801", labels=labels); }
module bearing_6802(labels=true){ bearing(15,24,5,"5972K213","6802", labels=labels); }
module bearing_6803(labels=true){ bearing(17,26,5,"5972K214","6803", labels=labels); }
module bearing_6804(labels=true){ bearing(20,32,7,"5972K215","6804", labels=labels); }
module bearing_6805(labels=true){ bearing(25,37,7,"5972K216","6805", labels=labels); }
module bearing_6806(labels=true){ bearing(30,42,7,"5972K217","6806", labels=labels); }
module bearing_6900(labels=true){ bearing(10,22,6,"5972K241","6900", labels=labels); }
module bearing_6901(labels=true){ bearing(12,24,6,"5972K242","6901", labels=labels); }
module bearing_6902(labels=true){ bearing(15,28,7,"5972K243","6902", labels=labels); }
module bearing_6903(labels=true){ bearing(17,30,7,"5972K244","6903", labels=labels); }
module bearing_6904(labels=true){ bearing(20,37,9,"5972K245","6904", labels=labels); }
module bearing_6905(labels=true){ bearing(25,42,9,"5972K246","6905", labels=labels); }
module bearing_6906(labels=true){ bearing(30,47,9,"5972K247","6906", labels=labels); }
module bearing_6907(labels=true){ bearing(35,55,10,"5972K248","6907", labels=labels); }
module bearing_6908(labels=true){ bearing(40,62,12,"5972K249","6908", labels=labels); }
module bearing_16002(labels=true){ bearing(15,32,8,"5972K199","16002", labels=labels); }
module bearing_16004(labels=true){ bearing(20,42,8,"5972K218","16004", labels=labels); }
module bearing_16005(labels=true){ bearing(25,47,8,"5972K219","16005", labels=labels); }
module bearing_16100(labels=true){ bearing(10,28,8,"5972K223","16100", labels=labels); }
module bearing_16101(labels=true){ bearing(12,30,8,"5972K224","16101", labels=labels); }

translate([0,0,0])
{   
    bearing_6800();
    bearing_6804();
    bearing_6907();
    translate([50,0,0])
    bearing_16101();
}


translate([0,60,0])
{   
    bearing_6800(labels=false);
    bearing_6804(labels=false);
    bearing_6907(labels=false);
    translate([50,0,0])
    bearing_16101(labels=false);
}
// file: ../Lib/mattlib.scad
include <../Lib/bearings.scad>;
include <../Lib/mirrorcopy.scad>;
include <../Lib/part_splitter.scad>;
include <../Lib/extrusion.scad>;
include <../Lib/pcd.scad>;
include <../Lib/metric_bolts.scad>;
include <../Lib/steppers.scad>;
include <../Lib/corner_radiuser.scad>;
include <../Lib/gears.scad>;
include <../Lib/prism.scad>;
include <../Lib/fillet_cylinder.scad>;
include <../Lib/o-ring.scad>;
// main file
use <../Lib/mattlib.scad>;
$fn=60;
module floppyDrive05K9283(){
    floppyDriveDims = [103.2,140.5,17];
    cube(floppyDriveDims, center=true);
    mirrorCopy([1,0,0])mirrorCopy([0,1,0])translate([41,55,(17/-2)-((18.4-17)/2)])cylinder(h=18.4-17,d=20, center=true);
    translate([0,-80,0])rotate([90,0,0])cylinder(h=20,d=floppyDriveDims.z, center=true);
    translate([0,-(floppyDriveDims.y+2)/2,0])cube([30,2,floppyDriveDims.z], center=true);
    if($preview){
        color("black")translate([0,60,(17/-2)+9.2])cube([90,100,3], center=true);
    }
}
floppyDrive05K9283();
